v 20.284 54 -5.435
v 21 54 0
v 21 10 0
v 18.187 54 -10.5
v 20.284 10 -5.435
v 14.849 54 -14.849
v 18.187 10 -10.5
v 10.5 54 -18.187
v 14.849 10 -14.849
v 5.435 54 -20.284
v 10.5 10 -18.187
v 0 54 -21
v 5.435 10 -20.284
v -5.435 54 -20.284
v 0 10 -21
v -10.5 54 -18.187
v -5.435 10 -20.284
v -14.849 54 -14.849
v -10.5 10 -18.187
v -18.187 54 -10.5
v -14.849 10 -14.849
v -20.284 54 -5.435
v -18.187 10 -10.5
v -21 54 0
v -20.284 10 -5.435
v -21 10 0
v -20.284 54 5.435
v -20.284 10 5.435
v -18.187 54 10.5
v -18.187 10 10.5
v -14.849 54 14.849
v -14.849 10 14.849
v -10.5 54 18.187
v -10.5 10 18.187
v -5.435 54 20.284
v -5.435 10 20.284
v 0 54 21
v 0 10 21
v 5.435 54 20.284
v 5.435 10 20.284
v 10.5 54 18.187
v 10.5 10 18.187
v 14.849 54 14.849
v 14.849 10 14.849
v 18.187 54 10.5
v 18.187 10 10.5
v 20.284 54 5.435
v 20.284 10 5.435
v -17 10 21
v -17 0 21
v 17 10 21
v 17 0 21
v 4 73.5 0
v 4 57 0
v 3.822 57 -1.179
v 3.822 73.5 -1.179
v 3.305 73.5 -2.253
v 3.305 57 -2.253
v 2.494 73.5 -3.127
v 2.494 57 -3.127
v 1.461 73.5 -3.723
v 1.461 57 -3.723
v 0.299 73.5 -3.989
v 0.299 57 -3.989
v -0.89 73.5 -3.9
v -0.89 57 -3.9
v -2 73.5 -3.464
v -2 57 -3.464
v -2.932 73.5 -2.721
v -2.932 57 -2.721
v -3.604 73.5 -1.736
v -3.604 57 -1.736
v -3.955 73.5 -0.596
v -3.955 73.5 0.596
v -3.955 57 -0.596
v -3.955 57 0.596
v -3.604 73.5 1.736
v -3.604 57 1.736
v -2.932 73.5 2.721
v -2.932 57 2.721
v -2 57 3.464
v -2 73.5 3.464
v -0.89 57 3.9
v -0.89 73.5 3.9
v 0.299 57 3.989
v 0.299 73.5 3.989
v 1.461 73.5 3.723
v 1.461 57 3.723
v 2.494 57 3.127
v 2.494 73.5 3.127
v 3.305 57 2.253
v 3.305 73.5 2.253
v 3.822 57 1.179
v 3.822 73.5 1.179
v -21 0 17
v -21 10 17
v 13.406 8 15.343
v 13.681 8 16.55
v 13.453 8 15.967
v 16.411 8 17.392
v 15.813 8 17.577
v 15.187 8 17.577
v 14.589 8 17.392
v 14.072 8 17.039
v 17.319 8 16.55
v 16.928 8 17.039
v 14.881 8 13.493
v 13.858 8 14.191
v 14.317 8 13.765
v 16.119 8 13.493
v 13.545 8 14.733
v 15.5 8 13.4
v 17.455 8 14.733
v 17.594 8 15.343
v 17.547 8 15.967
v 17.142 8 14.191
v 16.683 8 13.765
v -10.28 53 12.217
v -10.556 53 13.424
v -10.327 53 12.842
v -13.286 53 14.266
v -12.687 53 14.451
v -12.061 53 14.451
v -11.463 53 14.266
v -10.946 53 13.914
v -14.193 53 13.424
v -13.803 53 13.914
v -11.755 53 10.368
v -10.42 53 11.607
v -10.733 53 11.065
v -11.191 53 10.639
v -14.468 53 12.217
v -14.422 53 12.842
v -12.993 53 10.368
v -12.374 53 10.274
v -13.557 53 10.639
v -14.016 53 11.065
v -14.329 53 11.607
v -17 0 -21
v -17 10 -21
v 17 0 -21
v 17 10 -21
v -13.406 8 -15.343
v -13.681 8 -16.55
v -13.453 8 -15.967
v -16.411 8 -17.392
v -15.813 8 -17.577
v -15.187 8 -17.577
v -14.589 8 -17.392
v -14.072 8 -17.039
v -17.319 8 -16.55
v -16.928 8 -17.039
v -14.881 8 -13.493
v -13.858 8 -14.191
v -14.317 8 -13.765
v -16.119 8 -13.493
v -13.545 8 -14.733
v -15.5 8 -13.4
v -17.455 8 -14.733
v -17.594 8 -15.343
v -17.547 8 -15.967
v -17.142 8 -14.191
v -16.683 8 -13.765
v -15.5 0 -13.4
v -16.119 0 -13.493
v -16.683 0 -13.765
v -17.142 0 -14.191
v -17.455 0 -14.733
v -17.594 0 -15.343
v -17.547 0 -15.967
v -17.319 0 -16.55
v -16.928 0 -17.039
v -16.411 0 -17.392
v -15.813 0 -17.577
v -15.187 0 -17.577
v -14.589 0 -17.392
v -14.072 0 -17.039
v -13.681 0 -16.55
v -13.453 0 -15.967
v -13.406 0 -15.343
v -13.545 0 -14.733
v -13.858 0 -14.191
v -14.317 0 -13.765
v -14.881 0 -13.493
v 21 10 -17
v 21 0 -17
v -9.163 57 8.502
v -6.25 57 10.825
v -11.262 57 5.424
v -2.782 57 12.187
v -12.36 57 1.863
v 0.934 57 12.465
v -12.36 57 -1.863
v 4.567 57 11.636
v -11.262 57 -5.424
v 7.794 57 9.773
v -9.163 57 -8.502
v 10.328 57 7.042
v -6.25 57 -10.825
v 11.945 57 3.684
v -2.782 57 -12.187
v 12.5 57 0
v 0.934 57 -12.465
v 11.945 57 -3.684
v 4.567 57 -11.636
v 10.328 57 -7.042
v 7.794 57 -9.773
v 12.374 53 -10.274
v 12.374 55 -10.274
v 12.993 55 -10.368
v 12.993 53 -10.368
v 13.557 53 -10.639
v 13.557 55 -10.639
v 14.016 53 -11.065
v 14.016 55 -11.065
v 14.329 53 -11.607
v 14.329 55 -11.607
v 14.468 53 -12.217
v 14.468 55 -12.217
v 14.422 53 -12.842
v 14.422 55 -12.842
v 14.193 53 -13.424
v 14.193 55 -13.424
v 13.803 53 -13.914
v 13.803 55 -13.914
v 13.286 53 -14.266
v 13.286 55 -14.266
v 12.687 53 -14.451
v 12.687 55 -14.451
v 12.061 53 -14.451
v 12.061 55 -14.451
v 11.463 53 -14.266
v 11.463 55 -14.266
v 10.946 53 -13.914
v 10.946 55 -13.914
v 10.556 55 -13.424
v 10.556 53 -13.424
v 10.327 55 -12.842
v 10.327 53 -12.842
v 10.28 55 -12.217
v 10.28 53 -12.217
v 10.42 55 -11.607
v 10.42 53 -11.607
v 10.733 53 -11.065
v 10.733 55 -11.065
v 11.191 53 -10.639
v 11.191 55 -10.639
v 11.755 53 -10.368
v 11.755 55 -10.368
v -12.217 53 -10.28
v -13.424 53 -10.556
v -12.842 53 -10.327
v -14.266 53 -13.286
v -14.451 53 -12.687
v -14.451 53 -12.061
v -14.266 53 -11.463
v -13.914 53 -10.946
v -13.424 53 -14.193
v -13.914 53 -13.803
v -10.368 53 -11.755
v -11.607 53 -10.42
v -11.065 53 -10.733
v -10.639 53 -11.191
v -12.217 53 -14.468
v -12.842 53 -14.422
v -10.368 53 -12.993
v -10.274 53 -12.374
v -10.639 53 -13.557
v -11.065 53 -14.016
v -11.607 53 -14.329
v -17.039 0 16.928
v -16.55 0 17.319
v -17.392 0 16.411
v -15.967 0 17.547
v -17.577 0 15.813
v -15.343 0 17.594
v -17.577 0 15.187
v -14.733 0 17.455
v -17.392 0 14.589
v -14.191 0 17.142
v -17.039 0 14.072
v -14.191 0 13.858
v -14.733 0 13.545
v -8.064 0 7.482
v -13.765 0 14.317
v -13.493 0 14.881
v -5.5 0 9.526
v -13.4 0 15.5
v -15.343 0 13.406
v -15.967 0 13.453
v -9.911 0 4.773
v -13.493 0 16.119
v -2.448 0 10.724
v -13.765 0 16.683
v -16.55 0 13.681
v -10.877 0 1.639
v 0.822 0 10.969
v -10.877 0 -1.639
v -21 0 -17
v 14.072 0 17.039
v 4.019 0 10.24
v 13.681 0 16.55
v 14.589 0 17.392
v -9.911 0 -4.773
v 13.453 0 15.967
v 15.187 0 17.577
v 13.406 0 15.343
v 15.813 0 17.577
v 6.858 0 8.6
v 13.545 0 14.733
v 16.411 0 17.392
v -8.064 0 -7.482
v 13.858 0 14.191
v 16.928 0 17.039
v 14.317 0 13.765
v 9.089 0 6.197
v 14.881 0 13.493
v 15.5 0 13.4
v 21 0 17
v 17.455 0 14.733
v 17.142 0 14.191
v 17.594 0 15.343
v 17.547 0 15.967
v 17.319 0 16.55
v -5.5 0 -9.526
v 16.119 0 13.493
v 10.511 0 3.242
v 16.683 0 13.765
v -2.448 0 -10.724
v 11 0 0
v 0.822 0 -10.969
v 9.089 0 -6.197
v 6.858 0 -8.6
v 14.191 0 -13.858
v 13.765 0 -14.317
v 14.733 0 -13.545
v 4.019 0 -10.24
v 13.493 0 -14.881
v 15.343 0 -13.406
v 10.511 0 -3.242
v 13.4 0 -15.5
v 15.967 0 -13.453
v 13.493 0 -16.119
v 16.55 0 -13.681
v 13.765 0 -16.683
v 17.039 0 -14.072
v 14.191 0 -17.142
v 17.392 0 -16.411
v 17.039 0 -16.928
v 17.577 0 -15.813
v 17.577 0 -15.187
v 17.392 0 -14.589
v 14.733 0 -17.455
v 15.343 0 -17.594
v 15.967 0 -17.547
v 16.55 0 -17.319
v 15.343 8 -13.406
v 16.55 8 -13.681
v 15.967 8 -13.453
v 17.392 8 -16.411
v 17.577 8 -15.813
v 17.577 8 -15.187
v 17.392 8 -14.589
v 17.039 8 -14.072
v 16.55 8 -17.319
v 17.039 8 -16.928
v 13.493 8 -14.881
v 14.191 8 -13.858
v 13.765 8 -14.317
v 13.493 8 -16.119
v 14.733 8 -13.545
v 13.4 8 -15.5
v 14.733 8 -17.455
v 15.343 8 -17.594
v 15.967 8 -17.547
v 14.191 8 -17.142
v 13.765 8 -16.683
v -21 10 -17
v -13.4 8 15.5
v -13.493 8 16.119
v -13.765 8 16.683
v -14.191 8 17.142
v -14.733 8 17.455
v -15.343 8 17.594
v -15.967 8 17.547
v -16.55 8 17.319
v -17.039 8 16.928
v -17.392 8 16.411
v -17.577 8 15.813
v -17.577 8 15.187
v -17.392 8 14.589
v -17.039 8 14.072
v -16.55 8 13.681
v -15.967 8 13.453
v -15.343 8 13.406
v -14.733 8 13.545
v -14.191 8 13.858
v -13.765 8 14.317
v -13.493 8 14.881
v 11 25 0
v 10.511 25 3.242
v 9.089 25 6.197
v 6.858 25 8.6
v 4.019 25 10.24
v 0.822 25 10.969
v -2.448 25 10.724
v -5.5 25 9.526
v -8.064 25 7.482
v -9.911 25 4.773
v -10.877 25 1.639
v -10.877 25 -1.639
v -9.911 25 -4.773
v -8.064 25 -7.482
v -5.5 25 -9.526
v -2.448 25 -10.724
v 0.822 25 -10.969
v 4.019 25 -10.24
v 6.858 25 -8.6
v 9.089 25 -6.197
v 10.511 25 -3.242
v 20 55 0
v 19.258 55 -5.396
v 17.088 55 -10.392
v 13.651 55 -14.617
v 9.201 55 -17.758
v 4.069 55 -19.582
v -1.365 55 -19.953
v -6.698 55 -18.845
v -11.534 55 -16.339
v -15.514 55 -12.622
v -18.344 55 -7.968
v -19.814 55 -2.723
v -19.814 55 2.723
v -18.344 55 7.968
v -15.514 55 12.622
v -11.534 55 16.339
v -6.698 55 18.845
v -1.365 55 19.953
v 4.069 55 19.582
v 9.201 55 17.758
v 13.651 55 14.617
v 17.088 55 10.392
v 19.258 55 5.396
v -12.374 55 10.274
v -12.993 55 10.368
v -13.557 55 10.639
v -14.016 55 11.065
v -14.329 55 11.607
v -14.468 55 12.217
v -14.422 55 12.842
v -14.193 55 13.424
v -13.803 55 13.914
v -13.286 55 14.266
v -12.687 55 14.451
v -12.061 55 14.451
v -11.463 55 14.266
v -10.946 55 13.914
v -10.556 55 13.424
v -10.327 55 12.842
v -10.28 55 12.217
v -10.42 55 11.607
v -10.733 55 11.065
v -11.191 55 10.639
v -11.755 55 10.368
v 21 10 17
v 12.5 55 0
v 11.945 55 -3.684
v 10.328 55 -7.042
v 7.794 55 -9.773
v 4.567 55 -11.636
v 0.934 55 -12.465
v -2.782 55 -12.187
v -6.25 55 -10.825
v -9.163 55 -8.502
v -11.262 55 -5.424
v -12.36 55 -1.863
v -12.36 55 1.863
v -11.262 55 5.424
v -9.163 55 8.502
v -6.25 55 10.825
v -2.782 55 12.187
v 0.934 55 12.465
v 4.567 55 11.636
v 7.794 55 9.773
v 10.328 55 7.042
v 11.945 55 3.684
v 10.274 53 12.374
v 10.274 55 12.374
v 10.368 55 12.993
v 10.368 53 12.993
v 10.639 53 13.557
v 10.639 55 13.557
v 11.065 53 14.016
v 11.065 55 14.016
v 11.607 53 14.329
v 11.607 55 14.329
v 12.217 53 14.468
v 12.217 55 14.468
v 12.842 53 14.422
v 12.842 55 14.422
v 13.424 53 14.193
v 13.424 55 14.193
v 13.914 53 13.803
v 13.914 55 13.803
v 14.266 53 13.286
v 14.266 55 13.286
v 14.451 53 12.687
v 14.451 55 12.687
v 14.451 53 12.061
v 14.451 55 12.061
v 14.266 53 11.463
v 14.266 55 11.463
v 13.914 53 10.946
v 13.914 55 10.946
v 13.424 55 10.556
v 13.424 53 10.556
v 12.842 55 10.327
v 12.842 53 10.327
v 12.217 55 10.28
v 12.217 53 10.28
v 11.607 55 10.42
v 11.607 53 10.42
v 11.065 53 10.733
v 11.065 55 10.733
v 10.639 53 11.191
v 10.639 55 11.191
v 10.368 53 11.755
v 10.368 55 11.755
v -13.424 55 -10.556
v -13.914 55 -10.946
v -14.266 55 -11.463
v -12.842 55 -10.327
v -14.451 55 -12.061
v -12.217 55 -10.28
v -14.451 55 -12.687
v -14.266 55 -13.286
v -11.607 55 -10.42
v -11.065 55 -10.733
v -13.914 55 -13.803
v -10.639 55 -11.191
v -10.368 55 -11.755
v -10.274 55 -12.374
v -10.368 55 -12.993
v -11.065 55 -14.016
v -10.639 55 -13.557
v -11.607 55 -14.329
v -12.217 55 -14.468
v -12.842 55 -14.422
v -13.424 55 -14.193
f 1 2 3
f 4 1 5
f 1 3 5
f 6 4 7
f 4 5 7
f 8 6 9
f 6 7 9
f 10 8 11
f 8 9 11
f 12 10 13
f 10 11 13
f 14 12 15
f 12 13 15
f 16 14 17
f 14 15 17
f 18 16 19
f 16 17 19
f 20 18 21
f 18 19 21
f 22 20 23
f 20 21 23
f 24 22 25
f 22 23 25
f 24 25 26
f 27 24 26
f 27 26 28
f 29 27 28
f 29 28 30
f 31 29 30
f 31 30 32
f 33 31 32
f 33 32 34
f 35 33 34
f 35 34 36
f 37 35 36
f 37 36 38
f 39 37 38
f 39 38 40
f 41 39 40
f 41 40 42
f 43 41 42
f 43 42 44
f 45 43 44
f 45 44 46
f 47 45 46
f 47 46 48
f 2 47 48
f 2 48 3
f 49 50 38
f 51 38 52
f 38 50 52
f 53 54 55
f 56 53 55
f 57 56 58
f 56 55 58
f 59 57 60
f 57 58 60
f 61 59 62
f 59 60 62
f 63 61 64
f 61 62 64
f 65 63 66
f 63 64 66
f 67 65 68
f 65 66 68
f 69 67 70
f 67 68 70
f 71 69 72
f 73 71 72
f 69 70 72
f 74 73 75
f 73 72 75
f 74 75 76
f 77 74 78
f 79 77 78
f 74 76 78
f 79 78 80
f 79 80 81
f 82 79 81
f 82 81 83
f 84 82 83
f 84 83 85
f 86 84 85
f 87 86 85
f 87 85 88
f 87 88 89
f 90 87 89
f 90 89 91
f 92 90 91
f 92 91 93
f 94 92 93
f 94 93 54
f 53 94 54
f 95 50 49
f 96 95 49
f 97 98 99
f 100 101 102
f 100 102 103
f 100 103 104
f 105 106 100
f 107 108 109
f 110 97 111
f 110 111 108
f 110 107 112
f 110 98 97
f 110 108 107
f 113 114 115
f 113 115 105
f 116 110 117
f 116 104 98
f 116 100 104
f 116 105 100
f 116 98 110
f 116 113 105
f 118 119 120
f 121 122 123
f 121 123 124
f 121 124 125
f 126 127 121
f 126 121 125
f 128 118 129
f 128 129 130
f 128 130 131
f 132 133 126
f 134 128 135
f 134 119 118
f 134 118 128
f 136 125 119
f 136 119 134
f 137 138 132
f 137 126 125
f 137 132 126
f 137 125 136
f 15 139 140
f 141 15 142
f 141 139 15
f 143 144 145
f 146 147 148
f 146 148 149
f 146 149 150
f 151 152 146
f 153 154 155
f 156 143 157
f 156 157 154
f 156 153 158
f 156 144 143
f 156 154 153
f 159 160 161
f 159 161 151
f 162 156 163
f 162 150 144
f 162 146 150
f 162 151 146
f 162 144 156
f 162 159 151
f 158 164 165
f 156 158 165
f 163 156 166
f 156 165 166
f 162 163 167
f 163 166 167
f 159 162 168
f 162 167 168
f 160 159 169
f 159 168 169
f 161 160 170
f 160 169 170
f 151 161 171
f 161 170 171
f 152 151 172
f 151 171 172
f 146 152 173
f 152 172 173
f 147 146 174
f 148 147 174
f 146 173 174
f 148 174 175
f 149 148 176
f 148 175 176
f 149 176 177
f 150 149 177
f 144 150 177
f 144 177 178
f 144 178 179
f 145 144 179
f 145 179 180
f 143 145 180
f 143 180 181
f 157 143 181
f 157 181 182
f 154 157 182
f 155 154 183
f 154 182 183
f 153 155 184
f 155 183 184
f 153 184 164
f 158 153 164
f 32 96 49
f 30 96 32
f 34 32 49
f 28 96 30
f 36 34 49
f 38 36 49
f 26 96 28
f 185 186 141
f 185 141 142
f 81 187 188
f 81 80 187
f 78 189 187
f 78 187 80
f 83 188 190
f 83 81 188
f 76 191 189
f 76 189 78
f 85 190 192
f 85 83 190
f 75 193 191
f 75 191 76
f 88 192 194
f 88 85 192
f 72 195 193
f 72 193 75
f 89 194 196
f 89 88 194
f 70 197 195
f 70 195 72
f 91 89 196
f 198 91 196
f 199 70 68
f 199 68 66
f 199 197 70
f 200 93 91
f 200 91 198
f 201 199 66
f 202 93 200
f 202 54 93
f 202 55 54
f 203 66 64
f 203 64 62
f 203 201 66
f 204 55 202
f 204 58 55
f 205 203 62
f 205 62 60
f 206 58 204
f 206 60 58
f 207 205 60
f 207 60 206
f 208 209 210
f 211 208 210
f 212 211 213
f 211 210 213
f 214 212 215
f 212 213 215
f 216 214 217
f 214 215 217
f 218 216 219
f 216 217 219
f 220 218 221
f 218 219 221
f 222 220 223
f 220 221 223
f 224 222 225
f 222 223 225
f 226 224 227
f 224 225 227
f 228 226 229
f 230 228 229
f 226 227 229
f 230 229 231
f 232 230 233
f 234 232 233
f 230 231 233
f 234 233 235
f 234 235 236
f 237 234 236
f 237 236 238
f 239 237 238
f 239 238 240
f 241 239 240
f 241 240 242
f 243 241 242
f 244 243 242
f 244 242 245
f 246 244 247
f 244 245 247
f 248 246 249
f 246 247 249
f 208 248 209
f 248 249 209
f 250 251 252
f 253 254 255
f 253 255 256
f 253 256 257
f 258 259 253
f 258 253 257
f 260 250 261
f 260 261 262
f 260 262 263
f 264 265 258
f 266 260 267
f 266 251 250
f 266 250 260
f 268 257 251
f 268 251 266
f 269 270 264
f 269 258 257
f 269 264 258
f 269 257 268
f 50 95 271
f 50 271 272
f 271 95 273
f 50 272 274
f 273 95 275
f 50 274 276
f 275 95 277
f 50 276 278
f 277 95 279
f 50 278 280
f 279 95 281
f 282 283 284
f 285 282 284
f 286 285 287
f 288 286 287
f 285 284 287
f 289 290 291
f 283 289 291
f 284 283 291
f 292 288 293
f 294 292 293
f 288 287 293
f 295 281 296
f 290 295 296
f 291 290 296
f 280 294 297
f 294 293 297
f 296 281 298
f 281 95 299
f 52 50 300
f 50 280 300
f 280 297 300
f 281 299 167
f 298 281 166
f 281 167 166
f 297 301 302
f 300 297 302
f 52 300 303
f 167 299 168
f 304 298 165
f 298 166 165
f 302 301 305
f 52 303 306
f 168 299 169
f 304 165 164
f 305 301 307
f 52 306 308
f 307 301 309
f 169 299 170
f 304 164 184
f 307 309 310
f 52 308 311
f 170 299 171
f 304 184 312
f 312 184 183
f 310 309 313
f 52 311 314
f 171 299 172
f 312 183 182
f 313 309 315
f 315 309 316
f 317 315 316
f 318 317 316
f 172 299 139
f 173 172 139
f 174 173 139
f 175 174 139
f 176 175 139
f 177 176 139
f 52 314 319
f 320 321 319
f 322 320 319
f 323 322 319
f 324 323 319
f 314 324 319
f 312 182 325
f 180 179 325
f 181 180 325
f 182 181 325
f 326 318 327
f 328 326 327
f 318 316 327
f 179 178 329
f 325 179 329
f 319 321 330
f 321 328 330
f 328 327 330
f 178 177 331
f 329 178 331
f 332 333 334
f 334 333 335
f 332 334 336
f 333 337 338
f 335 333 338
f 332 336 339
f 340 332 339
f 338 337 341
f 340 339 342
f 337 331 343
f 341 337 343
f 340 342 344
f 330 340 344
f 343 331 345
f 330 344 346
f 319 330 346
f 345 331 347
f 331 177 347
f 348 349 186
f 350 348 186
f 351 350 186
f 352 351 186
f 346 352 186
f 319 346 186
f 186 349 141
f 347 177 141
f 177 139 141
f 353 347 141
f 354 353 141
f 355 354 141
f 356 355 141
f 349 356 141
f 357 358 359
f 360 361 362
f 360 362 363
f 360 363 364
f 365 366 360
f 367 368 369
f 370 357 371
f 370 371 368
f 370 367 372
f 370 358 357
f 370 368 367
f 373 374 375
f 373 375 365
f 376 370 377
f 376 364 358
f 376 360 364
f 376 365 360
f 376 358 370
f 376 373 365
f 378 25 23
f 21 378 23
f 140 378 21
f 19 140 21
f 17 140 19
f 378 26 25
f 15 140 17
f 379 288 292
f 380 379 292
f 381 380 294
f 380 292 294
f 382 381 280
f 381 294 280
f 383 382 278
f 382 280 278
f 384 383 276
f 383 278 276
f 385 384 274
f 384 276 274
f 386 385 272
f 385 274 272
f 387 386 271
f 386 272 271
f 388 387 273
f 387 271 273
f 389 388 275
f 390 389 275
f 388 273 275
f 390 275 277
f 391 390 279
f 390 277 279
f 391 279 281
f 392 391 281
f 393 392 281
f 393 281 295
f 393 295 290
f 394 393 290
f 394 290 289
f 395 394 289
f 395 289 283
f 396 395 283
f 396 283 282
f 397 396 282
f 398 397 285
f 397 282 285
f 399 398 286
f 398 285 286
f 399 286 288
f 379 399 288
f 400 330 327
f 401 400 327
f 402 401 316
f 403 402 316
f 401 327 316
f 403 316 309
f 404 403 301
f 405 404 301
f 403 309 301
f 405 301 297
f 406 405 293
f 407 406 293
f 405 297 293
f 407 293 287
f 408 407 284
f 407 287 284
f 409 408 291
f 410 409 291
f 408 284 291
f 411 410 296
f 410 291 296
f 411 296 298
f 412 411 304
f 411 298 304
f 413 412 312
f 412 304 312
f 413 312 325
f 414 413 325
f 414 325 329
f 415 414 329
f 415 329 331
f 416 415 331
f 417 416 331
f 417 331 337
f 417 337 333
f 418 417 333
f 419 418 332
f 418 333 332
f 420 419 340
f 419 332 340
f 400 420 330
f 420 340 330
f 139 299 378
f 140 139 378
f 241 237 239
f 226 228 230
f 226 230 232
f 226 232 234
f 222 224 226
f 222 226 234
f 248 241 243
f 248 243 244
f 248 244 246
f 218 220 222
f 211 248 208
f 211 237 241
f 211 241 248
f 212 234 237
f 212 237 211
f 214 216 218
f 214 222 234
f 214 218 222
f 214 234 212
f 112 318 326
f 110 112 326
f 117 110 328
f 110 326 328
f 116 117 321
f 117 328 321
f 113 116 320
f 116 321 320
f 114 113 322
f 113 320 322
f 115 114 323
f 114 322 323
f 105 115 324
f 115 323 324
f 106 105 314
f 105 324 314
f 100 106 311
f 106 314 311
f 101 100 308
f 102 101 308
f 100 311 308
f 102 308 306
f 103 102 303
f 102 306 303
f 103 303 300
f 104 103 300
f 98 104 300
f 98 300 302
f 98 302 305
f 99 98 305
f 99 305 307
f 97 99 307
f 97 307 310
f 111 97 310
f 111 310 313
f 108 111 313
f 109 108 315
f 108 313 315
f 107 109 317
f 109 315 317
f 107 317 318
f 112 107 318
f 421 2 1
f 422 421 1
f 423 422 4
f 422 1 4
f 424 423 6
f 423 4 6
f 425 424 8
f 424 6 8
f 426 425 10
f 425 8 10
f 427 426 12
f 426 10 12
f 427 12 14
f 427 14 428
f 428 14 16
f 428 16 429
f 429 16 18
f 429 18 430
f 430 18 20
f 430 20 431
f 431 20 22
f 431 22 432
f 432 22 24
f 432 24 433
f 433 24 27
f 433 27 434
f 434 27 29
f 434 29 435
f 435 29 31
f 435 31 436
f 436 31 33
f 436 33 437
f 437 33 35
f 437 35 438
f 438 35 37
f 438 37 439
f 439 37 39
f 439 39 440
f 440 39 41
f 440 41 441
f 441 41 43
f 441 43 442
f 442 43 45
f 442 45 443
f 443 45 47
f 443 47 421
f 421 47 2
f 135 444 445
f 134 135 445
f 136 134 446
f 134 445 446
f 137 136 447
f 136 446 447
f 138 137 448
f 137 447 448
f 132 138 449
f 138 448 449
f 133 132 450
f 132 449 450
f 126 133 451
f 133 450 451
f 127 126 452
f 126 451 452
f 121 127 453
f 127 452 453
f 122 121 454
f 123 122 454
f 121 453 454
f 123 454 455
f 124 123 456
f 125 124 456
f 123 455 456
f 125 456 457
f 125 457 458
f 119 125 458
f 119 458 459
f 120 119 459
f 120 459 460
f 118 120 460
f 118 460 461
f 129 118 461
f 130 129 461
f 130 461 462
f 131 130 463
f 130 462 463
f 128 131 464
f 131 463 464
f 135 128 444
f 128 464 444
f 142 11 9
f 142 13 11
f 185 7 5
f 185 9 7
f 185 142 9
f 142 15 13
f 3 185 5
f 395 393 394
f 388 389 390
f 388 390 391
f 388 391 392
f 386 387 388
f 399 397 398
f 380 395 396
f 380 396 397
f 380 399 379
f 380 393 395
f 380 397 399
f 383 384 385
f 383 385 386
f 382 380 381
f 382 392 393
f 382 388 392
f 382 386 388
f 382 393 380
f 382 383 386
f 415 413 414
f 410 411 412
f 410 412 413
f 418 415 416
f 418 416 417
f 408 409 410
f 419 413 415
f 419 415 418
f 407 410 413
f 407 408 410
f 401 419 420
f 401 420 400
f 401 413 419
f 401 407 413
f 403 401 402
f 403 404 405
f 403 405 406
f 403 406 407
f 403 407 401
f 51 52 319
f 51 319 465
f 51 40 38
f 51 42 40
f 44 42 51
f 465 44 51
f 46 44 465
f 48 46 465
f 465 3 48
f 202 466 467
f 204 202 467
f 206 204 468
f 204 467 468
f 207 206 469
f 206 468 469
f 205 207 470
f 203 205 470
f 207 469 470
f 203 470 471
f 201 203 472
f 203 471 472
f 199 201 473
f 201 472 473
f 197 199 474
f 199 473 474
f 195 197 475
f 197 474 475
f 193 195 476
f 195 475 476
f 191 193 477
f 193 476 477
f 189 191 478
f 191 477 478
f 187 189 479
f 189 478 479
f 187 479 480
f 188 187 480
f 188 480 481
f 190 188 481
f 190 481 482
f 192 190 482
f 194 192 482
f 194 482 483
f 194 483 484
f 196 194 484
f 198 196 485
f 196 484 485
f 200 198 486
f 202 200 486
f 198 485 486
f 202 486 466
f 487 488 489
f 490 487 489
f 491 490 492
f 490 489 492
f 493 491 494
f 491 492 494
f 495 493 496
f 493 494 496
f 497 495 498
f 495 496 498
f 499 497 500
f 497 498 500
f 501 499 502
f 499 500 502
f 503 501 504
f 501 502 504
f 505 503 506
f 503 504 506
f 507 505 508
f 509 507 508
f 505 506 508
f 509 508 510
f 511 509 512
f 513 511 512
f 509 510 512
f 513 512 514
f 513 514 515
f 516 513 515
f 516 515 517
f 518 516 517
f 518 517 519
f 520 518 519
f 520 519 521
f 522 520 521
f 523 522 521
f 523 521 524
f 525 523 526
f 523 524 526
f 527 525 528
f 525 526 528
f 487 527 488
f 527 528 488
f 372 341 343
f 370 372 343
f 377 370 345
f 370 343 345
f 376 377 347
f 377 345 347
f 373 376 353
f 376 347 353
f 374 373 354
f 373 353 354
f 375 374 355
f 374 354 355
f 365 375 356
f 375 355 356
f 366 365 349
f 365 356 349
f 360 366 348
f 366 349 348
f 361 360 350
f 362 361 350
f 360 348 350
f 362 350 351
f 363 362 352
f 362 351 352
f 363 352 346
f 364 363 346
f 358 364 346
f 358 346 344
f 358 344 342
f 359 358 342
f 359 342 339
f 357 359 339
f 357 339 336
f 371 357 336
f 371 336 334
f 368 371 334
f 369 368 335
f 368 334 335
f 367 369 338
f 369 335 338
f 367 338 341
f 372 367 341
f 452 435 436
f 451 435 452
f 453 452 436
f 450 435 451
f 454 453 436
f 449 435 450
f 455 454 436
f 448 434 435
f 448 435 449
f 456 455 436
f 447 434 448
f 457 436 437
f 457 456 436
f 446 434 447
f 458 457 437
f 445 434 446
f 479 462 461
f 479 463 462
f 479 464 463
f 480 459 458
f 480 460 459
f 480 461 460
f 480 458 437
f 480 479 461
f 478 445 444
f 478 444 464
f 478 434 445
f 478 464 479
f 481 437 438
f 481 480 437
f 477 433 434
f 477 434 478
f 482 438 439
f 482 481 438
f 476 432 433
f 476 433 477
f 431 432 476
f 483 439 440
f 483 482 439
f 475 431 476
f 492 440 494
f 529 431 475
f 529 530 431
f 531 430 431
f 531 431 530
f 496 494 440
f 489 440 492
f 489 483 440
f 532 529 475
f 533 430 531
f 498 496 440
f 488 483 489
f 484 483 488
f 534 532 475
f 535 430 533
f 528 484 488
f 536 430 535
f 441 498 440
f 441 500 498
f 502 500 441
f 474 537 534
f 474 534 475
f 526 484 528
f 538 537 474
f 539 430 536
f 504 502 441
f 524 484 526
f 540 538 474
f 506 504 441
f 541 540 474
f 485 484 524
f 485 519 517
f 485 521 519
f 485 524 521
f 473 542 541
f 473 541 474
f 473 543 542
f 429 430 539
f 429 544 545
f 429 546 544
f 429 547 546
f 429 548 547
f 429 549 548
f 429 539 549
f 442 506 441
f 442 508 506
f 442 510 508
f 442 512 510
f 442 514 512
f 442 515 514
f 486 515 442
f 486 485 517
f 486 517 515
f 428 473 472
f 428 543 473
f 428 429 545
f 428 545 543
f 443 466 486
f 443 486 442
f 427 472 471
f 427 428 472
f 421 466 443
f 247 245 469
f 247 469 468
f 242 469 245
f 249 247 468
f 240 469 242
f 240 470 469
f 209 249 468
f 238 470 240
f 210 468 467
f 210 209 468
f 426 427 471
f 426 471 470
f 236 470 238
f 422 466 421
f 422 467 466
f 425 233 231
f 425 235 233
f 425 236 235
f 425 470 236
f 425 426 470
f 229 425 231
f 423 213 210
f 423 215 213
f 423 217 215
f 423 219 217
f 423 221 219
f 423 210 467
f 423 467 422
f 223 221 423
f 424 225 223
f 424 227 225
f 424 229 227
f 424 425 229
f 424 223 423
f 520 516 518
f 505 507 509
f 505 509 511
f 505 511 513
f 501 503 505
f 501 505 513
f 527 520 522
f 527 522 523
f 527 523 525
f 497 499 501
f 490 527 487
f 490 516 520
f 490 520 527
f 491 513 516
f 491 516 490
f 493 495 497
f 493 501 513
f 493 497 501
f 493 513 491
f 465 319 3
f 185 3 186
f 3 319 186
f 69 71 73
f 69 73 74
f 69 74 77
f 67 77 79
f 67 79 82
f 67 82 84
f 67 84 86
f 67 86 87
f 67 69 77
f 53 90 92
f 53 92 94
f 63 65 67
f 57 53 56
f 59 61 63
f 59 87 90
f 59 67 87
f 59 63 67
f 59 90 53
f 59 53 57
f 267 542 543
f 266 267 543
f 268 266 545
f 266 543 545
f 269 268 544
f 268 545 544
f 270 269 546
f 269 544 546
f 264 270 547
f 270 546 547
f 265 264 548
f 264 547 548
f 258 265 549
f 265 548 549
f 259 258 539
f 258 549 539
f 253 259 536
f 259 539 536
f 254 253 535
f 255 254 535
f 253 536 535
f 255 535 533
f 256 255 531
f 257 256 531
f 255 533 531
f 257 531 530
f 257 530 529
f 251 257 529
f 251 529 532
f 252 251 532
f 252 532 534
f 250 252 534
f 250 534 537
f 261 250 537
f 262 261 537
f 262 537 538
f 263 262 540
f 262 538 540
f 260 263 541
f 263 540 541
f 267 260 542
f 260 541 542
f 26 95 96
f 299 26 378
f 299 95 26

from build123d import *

# Parameters (mm, degrees)
SKETCH_1_W               = 42
SKETCH_1_H               = 42
EXTRUDE_1_DEPTH          = 10
SKETCH_2_R               = 21
EXTRUDE_2_DEPTH          = 45
SKETCH_3_R               = 4
EXTRUDE_3_DEPTH          = 18.5
CHAMFER_1_SIZE           = 4
SKETCH_4_R               = 11
CUT_EXTRUDE_1_DEPTH      = 25
SKETCH_5_R               = 12.5
EXTRUDE_4_DEPTH          = 2
CHAMFER_2_SIZE           = 1
SKETCH_6_R               = 2.1
CUT_EXTRUDE_2_DEPTH      = 2
PATTERN_CIRCULAR_1_COUNT = 4
SKETCH_7_R               = 2.1
CUT_EXTRUDE_3_DEPTH      = 8
PATTERN_CIRCULAR_2_COUNT = 4


with BuildPart() as part:
    # 草圖1 → 填料-伸長1 (new body)
    with BuildSketch(Plane(origin=(0, 0, 0), x_dir=(1, 0, 0), z_dir=(0, 1, 0))):
        Rectangle(SKETCH_1_W, SKETCH_1_H)
    extrude(amount=EXTRUDE_1_DEPTH)

    # 草圖2 → 填料-伸長2 (add)
    with BuildSketch(Plane(origin=(0, 10, 0), x_dir=(1, 0, 0), z_dir=(0, 1, 0))):
        Circle(SKETCH_2_R)
    extrude(amount=EXTRUDE_2_DEPTH)

    # 草圖3 → 填料-伸長3 (add)
    with BuildSketch(Plane(origin=(0, 55, 0), x_dir=(1, 0, 0), z_dir=(0, 1, 0))):
        Circle(SKETCH_3_R)
    extrude(amount=EXTRUDE_3_DEPTH)

    # 導角1
    chamfer_1_edges = [part.edges().sort_by_distance(p)[0] for p in [
        (21, 5, 21),
        (-21, 5, 21),
        (-21, 5, -21),
        (21, 5, -21),
    ]]
    chamfer(chamfer_1_edges, length=CHAMFER_1_SIZE)

    # 草圖4 → 除料-伸長1 (cut)
    with BuildSketch(Plane.XZ):
        Circle(SKETCH_4_R)
    extrude(amount=-CUT_EXTRUDE_1_DEPTH, mode=Mode.SUBTRACT)

    # 草圖5 → 填料-伸長4 (add)
    with BuildSketch(Plane(origin=(0, 55, 0), x_dir=(1, 0, 0), z_dir=(0, 1, 0))):
        Circle(SKETCH_5_R)
    extrude(amount=EXTRUDE_4_DEPTH)

    # 導角2
    chamfer_2_edges = [part.edges().sort_by_distance(p)[0] for p in [
        (-21, 55, 0),
    ]]
    chamfer(chamfer_2_edges, length=CHAMFER_2_SIZE)

    # 草圖6 → 除料-伸長2 (cut)
    with BuildSketch(Plane(origin=(0, 55, 0), x_dir=(1, 0, 0), z_dir=(0, 1, 0))):
        with Locations((-12.374368671, 12.374368671)):
            Circle(SKETCH_6_R)
    cut_extrude_2 = extrude(amount=-CUT_EXTRUDE_2_DEPTH, mode=Mode.SUBTRACT)

    # 環狀複製排列1: 除料-伸長2 ×4 about axis
    pattern_circular_1_axis = Axis((0, 0, 0), (0, 1, 0))
    for i in range(1, PATTERN_CIRCULAR_1_COUNT):
        add(cut_extrude_2.rotate(pattern_circular_1_axis, i * 360 / PATTERN_CIRCULAR_1_COUNT), mode=Mode.SUBTRACT)

    # 草圖7 → 除料-伸長3 (cut)
    with BuildSketch(Plane.XZ):
        with Locations((-15.5, 15.5)):
            Circle(SKETCH_7_R)
    cut_extrude_3 = extrude(amount=-CUT_EXTRUDE_3_DEPTH, mode=Mode.SUBTRACT)

    # 環狀複製排列2: 除料-伸長3 ×4 about axis
    pattern_circular_2_axis = Axis((0, 0, 0), (0, 1, 0))
    for i in range(1, PATTERN_CIRCULAR_2_COUNT):
        add(cut_extrude_3.rotate(pattern_circular_2_axis, i * 360 / PATTERN_CIRCULAR_2_COUNT), mode=Mode.SUBTRACT)


solid = part.part
